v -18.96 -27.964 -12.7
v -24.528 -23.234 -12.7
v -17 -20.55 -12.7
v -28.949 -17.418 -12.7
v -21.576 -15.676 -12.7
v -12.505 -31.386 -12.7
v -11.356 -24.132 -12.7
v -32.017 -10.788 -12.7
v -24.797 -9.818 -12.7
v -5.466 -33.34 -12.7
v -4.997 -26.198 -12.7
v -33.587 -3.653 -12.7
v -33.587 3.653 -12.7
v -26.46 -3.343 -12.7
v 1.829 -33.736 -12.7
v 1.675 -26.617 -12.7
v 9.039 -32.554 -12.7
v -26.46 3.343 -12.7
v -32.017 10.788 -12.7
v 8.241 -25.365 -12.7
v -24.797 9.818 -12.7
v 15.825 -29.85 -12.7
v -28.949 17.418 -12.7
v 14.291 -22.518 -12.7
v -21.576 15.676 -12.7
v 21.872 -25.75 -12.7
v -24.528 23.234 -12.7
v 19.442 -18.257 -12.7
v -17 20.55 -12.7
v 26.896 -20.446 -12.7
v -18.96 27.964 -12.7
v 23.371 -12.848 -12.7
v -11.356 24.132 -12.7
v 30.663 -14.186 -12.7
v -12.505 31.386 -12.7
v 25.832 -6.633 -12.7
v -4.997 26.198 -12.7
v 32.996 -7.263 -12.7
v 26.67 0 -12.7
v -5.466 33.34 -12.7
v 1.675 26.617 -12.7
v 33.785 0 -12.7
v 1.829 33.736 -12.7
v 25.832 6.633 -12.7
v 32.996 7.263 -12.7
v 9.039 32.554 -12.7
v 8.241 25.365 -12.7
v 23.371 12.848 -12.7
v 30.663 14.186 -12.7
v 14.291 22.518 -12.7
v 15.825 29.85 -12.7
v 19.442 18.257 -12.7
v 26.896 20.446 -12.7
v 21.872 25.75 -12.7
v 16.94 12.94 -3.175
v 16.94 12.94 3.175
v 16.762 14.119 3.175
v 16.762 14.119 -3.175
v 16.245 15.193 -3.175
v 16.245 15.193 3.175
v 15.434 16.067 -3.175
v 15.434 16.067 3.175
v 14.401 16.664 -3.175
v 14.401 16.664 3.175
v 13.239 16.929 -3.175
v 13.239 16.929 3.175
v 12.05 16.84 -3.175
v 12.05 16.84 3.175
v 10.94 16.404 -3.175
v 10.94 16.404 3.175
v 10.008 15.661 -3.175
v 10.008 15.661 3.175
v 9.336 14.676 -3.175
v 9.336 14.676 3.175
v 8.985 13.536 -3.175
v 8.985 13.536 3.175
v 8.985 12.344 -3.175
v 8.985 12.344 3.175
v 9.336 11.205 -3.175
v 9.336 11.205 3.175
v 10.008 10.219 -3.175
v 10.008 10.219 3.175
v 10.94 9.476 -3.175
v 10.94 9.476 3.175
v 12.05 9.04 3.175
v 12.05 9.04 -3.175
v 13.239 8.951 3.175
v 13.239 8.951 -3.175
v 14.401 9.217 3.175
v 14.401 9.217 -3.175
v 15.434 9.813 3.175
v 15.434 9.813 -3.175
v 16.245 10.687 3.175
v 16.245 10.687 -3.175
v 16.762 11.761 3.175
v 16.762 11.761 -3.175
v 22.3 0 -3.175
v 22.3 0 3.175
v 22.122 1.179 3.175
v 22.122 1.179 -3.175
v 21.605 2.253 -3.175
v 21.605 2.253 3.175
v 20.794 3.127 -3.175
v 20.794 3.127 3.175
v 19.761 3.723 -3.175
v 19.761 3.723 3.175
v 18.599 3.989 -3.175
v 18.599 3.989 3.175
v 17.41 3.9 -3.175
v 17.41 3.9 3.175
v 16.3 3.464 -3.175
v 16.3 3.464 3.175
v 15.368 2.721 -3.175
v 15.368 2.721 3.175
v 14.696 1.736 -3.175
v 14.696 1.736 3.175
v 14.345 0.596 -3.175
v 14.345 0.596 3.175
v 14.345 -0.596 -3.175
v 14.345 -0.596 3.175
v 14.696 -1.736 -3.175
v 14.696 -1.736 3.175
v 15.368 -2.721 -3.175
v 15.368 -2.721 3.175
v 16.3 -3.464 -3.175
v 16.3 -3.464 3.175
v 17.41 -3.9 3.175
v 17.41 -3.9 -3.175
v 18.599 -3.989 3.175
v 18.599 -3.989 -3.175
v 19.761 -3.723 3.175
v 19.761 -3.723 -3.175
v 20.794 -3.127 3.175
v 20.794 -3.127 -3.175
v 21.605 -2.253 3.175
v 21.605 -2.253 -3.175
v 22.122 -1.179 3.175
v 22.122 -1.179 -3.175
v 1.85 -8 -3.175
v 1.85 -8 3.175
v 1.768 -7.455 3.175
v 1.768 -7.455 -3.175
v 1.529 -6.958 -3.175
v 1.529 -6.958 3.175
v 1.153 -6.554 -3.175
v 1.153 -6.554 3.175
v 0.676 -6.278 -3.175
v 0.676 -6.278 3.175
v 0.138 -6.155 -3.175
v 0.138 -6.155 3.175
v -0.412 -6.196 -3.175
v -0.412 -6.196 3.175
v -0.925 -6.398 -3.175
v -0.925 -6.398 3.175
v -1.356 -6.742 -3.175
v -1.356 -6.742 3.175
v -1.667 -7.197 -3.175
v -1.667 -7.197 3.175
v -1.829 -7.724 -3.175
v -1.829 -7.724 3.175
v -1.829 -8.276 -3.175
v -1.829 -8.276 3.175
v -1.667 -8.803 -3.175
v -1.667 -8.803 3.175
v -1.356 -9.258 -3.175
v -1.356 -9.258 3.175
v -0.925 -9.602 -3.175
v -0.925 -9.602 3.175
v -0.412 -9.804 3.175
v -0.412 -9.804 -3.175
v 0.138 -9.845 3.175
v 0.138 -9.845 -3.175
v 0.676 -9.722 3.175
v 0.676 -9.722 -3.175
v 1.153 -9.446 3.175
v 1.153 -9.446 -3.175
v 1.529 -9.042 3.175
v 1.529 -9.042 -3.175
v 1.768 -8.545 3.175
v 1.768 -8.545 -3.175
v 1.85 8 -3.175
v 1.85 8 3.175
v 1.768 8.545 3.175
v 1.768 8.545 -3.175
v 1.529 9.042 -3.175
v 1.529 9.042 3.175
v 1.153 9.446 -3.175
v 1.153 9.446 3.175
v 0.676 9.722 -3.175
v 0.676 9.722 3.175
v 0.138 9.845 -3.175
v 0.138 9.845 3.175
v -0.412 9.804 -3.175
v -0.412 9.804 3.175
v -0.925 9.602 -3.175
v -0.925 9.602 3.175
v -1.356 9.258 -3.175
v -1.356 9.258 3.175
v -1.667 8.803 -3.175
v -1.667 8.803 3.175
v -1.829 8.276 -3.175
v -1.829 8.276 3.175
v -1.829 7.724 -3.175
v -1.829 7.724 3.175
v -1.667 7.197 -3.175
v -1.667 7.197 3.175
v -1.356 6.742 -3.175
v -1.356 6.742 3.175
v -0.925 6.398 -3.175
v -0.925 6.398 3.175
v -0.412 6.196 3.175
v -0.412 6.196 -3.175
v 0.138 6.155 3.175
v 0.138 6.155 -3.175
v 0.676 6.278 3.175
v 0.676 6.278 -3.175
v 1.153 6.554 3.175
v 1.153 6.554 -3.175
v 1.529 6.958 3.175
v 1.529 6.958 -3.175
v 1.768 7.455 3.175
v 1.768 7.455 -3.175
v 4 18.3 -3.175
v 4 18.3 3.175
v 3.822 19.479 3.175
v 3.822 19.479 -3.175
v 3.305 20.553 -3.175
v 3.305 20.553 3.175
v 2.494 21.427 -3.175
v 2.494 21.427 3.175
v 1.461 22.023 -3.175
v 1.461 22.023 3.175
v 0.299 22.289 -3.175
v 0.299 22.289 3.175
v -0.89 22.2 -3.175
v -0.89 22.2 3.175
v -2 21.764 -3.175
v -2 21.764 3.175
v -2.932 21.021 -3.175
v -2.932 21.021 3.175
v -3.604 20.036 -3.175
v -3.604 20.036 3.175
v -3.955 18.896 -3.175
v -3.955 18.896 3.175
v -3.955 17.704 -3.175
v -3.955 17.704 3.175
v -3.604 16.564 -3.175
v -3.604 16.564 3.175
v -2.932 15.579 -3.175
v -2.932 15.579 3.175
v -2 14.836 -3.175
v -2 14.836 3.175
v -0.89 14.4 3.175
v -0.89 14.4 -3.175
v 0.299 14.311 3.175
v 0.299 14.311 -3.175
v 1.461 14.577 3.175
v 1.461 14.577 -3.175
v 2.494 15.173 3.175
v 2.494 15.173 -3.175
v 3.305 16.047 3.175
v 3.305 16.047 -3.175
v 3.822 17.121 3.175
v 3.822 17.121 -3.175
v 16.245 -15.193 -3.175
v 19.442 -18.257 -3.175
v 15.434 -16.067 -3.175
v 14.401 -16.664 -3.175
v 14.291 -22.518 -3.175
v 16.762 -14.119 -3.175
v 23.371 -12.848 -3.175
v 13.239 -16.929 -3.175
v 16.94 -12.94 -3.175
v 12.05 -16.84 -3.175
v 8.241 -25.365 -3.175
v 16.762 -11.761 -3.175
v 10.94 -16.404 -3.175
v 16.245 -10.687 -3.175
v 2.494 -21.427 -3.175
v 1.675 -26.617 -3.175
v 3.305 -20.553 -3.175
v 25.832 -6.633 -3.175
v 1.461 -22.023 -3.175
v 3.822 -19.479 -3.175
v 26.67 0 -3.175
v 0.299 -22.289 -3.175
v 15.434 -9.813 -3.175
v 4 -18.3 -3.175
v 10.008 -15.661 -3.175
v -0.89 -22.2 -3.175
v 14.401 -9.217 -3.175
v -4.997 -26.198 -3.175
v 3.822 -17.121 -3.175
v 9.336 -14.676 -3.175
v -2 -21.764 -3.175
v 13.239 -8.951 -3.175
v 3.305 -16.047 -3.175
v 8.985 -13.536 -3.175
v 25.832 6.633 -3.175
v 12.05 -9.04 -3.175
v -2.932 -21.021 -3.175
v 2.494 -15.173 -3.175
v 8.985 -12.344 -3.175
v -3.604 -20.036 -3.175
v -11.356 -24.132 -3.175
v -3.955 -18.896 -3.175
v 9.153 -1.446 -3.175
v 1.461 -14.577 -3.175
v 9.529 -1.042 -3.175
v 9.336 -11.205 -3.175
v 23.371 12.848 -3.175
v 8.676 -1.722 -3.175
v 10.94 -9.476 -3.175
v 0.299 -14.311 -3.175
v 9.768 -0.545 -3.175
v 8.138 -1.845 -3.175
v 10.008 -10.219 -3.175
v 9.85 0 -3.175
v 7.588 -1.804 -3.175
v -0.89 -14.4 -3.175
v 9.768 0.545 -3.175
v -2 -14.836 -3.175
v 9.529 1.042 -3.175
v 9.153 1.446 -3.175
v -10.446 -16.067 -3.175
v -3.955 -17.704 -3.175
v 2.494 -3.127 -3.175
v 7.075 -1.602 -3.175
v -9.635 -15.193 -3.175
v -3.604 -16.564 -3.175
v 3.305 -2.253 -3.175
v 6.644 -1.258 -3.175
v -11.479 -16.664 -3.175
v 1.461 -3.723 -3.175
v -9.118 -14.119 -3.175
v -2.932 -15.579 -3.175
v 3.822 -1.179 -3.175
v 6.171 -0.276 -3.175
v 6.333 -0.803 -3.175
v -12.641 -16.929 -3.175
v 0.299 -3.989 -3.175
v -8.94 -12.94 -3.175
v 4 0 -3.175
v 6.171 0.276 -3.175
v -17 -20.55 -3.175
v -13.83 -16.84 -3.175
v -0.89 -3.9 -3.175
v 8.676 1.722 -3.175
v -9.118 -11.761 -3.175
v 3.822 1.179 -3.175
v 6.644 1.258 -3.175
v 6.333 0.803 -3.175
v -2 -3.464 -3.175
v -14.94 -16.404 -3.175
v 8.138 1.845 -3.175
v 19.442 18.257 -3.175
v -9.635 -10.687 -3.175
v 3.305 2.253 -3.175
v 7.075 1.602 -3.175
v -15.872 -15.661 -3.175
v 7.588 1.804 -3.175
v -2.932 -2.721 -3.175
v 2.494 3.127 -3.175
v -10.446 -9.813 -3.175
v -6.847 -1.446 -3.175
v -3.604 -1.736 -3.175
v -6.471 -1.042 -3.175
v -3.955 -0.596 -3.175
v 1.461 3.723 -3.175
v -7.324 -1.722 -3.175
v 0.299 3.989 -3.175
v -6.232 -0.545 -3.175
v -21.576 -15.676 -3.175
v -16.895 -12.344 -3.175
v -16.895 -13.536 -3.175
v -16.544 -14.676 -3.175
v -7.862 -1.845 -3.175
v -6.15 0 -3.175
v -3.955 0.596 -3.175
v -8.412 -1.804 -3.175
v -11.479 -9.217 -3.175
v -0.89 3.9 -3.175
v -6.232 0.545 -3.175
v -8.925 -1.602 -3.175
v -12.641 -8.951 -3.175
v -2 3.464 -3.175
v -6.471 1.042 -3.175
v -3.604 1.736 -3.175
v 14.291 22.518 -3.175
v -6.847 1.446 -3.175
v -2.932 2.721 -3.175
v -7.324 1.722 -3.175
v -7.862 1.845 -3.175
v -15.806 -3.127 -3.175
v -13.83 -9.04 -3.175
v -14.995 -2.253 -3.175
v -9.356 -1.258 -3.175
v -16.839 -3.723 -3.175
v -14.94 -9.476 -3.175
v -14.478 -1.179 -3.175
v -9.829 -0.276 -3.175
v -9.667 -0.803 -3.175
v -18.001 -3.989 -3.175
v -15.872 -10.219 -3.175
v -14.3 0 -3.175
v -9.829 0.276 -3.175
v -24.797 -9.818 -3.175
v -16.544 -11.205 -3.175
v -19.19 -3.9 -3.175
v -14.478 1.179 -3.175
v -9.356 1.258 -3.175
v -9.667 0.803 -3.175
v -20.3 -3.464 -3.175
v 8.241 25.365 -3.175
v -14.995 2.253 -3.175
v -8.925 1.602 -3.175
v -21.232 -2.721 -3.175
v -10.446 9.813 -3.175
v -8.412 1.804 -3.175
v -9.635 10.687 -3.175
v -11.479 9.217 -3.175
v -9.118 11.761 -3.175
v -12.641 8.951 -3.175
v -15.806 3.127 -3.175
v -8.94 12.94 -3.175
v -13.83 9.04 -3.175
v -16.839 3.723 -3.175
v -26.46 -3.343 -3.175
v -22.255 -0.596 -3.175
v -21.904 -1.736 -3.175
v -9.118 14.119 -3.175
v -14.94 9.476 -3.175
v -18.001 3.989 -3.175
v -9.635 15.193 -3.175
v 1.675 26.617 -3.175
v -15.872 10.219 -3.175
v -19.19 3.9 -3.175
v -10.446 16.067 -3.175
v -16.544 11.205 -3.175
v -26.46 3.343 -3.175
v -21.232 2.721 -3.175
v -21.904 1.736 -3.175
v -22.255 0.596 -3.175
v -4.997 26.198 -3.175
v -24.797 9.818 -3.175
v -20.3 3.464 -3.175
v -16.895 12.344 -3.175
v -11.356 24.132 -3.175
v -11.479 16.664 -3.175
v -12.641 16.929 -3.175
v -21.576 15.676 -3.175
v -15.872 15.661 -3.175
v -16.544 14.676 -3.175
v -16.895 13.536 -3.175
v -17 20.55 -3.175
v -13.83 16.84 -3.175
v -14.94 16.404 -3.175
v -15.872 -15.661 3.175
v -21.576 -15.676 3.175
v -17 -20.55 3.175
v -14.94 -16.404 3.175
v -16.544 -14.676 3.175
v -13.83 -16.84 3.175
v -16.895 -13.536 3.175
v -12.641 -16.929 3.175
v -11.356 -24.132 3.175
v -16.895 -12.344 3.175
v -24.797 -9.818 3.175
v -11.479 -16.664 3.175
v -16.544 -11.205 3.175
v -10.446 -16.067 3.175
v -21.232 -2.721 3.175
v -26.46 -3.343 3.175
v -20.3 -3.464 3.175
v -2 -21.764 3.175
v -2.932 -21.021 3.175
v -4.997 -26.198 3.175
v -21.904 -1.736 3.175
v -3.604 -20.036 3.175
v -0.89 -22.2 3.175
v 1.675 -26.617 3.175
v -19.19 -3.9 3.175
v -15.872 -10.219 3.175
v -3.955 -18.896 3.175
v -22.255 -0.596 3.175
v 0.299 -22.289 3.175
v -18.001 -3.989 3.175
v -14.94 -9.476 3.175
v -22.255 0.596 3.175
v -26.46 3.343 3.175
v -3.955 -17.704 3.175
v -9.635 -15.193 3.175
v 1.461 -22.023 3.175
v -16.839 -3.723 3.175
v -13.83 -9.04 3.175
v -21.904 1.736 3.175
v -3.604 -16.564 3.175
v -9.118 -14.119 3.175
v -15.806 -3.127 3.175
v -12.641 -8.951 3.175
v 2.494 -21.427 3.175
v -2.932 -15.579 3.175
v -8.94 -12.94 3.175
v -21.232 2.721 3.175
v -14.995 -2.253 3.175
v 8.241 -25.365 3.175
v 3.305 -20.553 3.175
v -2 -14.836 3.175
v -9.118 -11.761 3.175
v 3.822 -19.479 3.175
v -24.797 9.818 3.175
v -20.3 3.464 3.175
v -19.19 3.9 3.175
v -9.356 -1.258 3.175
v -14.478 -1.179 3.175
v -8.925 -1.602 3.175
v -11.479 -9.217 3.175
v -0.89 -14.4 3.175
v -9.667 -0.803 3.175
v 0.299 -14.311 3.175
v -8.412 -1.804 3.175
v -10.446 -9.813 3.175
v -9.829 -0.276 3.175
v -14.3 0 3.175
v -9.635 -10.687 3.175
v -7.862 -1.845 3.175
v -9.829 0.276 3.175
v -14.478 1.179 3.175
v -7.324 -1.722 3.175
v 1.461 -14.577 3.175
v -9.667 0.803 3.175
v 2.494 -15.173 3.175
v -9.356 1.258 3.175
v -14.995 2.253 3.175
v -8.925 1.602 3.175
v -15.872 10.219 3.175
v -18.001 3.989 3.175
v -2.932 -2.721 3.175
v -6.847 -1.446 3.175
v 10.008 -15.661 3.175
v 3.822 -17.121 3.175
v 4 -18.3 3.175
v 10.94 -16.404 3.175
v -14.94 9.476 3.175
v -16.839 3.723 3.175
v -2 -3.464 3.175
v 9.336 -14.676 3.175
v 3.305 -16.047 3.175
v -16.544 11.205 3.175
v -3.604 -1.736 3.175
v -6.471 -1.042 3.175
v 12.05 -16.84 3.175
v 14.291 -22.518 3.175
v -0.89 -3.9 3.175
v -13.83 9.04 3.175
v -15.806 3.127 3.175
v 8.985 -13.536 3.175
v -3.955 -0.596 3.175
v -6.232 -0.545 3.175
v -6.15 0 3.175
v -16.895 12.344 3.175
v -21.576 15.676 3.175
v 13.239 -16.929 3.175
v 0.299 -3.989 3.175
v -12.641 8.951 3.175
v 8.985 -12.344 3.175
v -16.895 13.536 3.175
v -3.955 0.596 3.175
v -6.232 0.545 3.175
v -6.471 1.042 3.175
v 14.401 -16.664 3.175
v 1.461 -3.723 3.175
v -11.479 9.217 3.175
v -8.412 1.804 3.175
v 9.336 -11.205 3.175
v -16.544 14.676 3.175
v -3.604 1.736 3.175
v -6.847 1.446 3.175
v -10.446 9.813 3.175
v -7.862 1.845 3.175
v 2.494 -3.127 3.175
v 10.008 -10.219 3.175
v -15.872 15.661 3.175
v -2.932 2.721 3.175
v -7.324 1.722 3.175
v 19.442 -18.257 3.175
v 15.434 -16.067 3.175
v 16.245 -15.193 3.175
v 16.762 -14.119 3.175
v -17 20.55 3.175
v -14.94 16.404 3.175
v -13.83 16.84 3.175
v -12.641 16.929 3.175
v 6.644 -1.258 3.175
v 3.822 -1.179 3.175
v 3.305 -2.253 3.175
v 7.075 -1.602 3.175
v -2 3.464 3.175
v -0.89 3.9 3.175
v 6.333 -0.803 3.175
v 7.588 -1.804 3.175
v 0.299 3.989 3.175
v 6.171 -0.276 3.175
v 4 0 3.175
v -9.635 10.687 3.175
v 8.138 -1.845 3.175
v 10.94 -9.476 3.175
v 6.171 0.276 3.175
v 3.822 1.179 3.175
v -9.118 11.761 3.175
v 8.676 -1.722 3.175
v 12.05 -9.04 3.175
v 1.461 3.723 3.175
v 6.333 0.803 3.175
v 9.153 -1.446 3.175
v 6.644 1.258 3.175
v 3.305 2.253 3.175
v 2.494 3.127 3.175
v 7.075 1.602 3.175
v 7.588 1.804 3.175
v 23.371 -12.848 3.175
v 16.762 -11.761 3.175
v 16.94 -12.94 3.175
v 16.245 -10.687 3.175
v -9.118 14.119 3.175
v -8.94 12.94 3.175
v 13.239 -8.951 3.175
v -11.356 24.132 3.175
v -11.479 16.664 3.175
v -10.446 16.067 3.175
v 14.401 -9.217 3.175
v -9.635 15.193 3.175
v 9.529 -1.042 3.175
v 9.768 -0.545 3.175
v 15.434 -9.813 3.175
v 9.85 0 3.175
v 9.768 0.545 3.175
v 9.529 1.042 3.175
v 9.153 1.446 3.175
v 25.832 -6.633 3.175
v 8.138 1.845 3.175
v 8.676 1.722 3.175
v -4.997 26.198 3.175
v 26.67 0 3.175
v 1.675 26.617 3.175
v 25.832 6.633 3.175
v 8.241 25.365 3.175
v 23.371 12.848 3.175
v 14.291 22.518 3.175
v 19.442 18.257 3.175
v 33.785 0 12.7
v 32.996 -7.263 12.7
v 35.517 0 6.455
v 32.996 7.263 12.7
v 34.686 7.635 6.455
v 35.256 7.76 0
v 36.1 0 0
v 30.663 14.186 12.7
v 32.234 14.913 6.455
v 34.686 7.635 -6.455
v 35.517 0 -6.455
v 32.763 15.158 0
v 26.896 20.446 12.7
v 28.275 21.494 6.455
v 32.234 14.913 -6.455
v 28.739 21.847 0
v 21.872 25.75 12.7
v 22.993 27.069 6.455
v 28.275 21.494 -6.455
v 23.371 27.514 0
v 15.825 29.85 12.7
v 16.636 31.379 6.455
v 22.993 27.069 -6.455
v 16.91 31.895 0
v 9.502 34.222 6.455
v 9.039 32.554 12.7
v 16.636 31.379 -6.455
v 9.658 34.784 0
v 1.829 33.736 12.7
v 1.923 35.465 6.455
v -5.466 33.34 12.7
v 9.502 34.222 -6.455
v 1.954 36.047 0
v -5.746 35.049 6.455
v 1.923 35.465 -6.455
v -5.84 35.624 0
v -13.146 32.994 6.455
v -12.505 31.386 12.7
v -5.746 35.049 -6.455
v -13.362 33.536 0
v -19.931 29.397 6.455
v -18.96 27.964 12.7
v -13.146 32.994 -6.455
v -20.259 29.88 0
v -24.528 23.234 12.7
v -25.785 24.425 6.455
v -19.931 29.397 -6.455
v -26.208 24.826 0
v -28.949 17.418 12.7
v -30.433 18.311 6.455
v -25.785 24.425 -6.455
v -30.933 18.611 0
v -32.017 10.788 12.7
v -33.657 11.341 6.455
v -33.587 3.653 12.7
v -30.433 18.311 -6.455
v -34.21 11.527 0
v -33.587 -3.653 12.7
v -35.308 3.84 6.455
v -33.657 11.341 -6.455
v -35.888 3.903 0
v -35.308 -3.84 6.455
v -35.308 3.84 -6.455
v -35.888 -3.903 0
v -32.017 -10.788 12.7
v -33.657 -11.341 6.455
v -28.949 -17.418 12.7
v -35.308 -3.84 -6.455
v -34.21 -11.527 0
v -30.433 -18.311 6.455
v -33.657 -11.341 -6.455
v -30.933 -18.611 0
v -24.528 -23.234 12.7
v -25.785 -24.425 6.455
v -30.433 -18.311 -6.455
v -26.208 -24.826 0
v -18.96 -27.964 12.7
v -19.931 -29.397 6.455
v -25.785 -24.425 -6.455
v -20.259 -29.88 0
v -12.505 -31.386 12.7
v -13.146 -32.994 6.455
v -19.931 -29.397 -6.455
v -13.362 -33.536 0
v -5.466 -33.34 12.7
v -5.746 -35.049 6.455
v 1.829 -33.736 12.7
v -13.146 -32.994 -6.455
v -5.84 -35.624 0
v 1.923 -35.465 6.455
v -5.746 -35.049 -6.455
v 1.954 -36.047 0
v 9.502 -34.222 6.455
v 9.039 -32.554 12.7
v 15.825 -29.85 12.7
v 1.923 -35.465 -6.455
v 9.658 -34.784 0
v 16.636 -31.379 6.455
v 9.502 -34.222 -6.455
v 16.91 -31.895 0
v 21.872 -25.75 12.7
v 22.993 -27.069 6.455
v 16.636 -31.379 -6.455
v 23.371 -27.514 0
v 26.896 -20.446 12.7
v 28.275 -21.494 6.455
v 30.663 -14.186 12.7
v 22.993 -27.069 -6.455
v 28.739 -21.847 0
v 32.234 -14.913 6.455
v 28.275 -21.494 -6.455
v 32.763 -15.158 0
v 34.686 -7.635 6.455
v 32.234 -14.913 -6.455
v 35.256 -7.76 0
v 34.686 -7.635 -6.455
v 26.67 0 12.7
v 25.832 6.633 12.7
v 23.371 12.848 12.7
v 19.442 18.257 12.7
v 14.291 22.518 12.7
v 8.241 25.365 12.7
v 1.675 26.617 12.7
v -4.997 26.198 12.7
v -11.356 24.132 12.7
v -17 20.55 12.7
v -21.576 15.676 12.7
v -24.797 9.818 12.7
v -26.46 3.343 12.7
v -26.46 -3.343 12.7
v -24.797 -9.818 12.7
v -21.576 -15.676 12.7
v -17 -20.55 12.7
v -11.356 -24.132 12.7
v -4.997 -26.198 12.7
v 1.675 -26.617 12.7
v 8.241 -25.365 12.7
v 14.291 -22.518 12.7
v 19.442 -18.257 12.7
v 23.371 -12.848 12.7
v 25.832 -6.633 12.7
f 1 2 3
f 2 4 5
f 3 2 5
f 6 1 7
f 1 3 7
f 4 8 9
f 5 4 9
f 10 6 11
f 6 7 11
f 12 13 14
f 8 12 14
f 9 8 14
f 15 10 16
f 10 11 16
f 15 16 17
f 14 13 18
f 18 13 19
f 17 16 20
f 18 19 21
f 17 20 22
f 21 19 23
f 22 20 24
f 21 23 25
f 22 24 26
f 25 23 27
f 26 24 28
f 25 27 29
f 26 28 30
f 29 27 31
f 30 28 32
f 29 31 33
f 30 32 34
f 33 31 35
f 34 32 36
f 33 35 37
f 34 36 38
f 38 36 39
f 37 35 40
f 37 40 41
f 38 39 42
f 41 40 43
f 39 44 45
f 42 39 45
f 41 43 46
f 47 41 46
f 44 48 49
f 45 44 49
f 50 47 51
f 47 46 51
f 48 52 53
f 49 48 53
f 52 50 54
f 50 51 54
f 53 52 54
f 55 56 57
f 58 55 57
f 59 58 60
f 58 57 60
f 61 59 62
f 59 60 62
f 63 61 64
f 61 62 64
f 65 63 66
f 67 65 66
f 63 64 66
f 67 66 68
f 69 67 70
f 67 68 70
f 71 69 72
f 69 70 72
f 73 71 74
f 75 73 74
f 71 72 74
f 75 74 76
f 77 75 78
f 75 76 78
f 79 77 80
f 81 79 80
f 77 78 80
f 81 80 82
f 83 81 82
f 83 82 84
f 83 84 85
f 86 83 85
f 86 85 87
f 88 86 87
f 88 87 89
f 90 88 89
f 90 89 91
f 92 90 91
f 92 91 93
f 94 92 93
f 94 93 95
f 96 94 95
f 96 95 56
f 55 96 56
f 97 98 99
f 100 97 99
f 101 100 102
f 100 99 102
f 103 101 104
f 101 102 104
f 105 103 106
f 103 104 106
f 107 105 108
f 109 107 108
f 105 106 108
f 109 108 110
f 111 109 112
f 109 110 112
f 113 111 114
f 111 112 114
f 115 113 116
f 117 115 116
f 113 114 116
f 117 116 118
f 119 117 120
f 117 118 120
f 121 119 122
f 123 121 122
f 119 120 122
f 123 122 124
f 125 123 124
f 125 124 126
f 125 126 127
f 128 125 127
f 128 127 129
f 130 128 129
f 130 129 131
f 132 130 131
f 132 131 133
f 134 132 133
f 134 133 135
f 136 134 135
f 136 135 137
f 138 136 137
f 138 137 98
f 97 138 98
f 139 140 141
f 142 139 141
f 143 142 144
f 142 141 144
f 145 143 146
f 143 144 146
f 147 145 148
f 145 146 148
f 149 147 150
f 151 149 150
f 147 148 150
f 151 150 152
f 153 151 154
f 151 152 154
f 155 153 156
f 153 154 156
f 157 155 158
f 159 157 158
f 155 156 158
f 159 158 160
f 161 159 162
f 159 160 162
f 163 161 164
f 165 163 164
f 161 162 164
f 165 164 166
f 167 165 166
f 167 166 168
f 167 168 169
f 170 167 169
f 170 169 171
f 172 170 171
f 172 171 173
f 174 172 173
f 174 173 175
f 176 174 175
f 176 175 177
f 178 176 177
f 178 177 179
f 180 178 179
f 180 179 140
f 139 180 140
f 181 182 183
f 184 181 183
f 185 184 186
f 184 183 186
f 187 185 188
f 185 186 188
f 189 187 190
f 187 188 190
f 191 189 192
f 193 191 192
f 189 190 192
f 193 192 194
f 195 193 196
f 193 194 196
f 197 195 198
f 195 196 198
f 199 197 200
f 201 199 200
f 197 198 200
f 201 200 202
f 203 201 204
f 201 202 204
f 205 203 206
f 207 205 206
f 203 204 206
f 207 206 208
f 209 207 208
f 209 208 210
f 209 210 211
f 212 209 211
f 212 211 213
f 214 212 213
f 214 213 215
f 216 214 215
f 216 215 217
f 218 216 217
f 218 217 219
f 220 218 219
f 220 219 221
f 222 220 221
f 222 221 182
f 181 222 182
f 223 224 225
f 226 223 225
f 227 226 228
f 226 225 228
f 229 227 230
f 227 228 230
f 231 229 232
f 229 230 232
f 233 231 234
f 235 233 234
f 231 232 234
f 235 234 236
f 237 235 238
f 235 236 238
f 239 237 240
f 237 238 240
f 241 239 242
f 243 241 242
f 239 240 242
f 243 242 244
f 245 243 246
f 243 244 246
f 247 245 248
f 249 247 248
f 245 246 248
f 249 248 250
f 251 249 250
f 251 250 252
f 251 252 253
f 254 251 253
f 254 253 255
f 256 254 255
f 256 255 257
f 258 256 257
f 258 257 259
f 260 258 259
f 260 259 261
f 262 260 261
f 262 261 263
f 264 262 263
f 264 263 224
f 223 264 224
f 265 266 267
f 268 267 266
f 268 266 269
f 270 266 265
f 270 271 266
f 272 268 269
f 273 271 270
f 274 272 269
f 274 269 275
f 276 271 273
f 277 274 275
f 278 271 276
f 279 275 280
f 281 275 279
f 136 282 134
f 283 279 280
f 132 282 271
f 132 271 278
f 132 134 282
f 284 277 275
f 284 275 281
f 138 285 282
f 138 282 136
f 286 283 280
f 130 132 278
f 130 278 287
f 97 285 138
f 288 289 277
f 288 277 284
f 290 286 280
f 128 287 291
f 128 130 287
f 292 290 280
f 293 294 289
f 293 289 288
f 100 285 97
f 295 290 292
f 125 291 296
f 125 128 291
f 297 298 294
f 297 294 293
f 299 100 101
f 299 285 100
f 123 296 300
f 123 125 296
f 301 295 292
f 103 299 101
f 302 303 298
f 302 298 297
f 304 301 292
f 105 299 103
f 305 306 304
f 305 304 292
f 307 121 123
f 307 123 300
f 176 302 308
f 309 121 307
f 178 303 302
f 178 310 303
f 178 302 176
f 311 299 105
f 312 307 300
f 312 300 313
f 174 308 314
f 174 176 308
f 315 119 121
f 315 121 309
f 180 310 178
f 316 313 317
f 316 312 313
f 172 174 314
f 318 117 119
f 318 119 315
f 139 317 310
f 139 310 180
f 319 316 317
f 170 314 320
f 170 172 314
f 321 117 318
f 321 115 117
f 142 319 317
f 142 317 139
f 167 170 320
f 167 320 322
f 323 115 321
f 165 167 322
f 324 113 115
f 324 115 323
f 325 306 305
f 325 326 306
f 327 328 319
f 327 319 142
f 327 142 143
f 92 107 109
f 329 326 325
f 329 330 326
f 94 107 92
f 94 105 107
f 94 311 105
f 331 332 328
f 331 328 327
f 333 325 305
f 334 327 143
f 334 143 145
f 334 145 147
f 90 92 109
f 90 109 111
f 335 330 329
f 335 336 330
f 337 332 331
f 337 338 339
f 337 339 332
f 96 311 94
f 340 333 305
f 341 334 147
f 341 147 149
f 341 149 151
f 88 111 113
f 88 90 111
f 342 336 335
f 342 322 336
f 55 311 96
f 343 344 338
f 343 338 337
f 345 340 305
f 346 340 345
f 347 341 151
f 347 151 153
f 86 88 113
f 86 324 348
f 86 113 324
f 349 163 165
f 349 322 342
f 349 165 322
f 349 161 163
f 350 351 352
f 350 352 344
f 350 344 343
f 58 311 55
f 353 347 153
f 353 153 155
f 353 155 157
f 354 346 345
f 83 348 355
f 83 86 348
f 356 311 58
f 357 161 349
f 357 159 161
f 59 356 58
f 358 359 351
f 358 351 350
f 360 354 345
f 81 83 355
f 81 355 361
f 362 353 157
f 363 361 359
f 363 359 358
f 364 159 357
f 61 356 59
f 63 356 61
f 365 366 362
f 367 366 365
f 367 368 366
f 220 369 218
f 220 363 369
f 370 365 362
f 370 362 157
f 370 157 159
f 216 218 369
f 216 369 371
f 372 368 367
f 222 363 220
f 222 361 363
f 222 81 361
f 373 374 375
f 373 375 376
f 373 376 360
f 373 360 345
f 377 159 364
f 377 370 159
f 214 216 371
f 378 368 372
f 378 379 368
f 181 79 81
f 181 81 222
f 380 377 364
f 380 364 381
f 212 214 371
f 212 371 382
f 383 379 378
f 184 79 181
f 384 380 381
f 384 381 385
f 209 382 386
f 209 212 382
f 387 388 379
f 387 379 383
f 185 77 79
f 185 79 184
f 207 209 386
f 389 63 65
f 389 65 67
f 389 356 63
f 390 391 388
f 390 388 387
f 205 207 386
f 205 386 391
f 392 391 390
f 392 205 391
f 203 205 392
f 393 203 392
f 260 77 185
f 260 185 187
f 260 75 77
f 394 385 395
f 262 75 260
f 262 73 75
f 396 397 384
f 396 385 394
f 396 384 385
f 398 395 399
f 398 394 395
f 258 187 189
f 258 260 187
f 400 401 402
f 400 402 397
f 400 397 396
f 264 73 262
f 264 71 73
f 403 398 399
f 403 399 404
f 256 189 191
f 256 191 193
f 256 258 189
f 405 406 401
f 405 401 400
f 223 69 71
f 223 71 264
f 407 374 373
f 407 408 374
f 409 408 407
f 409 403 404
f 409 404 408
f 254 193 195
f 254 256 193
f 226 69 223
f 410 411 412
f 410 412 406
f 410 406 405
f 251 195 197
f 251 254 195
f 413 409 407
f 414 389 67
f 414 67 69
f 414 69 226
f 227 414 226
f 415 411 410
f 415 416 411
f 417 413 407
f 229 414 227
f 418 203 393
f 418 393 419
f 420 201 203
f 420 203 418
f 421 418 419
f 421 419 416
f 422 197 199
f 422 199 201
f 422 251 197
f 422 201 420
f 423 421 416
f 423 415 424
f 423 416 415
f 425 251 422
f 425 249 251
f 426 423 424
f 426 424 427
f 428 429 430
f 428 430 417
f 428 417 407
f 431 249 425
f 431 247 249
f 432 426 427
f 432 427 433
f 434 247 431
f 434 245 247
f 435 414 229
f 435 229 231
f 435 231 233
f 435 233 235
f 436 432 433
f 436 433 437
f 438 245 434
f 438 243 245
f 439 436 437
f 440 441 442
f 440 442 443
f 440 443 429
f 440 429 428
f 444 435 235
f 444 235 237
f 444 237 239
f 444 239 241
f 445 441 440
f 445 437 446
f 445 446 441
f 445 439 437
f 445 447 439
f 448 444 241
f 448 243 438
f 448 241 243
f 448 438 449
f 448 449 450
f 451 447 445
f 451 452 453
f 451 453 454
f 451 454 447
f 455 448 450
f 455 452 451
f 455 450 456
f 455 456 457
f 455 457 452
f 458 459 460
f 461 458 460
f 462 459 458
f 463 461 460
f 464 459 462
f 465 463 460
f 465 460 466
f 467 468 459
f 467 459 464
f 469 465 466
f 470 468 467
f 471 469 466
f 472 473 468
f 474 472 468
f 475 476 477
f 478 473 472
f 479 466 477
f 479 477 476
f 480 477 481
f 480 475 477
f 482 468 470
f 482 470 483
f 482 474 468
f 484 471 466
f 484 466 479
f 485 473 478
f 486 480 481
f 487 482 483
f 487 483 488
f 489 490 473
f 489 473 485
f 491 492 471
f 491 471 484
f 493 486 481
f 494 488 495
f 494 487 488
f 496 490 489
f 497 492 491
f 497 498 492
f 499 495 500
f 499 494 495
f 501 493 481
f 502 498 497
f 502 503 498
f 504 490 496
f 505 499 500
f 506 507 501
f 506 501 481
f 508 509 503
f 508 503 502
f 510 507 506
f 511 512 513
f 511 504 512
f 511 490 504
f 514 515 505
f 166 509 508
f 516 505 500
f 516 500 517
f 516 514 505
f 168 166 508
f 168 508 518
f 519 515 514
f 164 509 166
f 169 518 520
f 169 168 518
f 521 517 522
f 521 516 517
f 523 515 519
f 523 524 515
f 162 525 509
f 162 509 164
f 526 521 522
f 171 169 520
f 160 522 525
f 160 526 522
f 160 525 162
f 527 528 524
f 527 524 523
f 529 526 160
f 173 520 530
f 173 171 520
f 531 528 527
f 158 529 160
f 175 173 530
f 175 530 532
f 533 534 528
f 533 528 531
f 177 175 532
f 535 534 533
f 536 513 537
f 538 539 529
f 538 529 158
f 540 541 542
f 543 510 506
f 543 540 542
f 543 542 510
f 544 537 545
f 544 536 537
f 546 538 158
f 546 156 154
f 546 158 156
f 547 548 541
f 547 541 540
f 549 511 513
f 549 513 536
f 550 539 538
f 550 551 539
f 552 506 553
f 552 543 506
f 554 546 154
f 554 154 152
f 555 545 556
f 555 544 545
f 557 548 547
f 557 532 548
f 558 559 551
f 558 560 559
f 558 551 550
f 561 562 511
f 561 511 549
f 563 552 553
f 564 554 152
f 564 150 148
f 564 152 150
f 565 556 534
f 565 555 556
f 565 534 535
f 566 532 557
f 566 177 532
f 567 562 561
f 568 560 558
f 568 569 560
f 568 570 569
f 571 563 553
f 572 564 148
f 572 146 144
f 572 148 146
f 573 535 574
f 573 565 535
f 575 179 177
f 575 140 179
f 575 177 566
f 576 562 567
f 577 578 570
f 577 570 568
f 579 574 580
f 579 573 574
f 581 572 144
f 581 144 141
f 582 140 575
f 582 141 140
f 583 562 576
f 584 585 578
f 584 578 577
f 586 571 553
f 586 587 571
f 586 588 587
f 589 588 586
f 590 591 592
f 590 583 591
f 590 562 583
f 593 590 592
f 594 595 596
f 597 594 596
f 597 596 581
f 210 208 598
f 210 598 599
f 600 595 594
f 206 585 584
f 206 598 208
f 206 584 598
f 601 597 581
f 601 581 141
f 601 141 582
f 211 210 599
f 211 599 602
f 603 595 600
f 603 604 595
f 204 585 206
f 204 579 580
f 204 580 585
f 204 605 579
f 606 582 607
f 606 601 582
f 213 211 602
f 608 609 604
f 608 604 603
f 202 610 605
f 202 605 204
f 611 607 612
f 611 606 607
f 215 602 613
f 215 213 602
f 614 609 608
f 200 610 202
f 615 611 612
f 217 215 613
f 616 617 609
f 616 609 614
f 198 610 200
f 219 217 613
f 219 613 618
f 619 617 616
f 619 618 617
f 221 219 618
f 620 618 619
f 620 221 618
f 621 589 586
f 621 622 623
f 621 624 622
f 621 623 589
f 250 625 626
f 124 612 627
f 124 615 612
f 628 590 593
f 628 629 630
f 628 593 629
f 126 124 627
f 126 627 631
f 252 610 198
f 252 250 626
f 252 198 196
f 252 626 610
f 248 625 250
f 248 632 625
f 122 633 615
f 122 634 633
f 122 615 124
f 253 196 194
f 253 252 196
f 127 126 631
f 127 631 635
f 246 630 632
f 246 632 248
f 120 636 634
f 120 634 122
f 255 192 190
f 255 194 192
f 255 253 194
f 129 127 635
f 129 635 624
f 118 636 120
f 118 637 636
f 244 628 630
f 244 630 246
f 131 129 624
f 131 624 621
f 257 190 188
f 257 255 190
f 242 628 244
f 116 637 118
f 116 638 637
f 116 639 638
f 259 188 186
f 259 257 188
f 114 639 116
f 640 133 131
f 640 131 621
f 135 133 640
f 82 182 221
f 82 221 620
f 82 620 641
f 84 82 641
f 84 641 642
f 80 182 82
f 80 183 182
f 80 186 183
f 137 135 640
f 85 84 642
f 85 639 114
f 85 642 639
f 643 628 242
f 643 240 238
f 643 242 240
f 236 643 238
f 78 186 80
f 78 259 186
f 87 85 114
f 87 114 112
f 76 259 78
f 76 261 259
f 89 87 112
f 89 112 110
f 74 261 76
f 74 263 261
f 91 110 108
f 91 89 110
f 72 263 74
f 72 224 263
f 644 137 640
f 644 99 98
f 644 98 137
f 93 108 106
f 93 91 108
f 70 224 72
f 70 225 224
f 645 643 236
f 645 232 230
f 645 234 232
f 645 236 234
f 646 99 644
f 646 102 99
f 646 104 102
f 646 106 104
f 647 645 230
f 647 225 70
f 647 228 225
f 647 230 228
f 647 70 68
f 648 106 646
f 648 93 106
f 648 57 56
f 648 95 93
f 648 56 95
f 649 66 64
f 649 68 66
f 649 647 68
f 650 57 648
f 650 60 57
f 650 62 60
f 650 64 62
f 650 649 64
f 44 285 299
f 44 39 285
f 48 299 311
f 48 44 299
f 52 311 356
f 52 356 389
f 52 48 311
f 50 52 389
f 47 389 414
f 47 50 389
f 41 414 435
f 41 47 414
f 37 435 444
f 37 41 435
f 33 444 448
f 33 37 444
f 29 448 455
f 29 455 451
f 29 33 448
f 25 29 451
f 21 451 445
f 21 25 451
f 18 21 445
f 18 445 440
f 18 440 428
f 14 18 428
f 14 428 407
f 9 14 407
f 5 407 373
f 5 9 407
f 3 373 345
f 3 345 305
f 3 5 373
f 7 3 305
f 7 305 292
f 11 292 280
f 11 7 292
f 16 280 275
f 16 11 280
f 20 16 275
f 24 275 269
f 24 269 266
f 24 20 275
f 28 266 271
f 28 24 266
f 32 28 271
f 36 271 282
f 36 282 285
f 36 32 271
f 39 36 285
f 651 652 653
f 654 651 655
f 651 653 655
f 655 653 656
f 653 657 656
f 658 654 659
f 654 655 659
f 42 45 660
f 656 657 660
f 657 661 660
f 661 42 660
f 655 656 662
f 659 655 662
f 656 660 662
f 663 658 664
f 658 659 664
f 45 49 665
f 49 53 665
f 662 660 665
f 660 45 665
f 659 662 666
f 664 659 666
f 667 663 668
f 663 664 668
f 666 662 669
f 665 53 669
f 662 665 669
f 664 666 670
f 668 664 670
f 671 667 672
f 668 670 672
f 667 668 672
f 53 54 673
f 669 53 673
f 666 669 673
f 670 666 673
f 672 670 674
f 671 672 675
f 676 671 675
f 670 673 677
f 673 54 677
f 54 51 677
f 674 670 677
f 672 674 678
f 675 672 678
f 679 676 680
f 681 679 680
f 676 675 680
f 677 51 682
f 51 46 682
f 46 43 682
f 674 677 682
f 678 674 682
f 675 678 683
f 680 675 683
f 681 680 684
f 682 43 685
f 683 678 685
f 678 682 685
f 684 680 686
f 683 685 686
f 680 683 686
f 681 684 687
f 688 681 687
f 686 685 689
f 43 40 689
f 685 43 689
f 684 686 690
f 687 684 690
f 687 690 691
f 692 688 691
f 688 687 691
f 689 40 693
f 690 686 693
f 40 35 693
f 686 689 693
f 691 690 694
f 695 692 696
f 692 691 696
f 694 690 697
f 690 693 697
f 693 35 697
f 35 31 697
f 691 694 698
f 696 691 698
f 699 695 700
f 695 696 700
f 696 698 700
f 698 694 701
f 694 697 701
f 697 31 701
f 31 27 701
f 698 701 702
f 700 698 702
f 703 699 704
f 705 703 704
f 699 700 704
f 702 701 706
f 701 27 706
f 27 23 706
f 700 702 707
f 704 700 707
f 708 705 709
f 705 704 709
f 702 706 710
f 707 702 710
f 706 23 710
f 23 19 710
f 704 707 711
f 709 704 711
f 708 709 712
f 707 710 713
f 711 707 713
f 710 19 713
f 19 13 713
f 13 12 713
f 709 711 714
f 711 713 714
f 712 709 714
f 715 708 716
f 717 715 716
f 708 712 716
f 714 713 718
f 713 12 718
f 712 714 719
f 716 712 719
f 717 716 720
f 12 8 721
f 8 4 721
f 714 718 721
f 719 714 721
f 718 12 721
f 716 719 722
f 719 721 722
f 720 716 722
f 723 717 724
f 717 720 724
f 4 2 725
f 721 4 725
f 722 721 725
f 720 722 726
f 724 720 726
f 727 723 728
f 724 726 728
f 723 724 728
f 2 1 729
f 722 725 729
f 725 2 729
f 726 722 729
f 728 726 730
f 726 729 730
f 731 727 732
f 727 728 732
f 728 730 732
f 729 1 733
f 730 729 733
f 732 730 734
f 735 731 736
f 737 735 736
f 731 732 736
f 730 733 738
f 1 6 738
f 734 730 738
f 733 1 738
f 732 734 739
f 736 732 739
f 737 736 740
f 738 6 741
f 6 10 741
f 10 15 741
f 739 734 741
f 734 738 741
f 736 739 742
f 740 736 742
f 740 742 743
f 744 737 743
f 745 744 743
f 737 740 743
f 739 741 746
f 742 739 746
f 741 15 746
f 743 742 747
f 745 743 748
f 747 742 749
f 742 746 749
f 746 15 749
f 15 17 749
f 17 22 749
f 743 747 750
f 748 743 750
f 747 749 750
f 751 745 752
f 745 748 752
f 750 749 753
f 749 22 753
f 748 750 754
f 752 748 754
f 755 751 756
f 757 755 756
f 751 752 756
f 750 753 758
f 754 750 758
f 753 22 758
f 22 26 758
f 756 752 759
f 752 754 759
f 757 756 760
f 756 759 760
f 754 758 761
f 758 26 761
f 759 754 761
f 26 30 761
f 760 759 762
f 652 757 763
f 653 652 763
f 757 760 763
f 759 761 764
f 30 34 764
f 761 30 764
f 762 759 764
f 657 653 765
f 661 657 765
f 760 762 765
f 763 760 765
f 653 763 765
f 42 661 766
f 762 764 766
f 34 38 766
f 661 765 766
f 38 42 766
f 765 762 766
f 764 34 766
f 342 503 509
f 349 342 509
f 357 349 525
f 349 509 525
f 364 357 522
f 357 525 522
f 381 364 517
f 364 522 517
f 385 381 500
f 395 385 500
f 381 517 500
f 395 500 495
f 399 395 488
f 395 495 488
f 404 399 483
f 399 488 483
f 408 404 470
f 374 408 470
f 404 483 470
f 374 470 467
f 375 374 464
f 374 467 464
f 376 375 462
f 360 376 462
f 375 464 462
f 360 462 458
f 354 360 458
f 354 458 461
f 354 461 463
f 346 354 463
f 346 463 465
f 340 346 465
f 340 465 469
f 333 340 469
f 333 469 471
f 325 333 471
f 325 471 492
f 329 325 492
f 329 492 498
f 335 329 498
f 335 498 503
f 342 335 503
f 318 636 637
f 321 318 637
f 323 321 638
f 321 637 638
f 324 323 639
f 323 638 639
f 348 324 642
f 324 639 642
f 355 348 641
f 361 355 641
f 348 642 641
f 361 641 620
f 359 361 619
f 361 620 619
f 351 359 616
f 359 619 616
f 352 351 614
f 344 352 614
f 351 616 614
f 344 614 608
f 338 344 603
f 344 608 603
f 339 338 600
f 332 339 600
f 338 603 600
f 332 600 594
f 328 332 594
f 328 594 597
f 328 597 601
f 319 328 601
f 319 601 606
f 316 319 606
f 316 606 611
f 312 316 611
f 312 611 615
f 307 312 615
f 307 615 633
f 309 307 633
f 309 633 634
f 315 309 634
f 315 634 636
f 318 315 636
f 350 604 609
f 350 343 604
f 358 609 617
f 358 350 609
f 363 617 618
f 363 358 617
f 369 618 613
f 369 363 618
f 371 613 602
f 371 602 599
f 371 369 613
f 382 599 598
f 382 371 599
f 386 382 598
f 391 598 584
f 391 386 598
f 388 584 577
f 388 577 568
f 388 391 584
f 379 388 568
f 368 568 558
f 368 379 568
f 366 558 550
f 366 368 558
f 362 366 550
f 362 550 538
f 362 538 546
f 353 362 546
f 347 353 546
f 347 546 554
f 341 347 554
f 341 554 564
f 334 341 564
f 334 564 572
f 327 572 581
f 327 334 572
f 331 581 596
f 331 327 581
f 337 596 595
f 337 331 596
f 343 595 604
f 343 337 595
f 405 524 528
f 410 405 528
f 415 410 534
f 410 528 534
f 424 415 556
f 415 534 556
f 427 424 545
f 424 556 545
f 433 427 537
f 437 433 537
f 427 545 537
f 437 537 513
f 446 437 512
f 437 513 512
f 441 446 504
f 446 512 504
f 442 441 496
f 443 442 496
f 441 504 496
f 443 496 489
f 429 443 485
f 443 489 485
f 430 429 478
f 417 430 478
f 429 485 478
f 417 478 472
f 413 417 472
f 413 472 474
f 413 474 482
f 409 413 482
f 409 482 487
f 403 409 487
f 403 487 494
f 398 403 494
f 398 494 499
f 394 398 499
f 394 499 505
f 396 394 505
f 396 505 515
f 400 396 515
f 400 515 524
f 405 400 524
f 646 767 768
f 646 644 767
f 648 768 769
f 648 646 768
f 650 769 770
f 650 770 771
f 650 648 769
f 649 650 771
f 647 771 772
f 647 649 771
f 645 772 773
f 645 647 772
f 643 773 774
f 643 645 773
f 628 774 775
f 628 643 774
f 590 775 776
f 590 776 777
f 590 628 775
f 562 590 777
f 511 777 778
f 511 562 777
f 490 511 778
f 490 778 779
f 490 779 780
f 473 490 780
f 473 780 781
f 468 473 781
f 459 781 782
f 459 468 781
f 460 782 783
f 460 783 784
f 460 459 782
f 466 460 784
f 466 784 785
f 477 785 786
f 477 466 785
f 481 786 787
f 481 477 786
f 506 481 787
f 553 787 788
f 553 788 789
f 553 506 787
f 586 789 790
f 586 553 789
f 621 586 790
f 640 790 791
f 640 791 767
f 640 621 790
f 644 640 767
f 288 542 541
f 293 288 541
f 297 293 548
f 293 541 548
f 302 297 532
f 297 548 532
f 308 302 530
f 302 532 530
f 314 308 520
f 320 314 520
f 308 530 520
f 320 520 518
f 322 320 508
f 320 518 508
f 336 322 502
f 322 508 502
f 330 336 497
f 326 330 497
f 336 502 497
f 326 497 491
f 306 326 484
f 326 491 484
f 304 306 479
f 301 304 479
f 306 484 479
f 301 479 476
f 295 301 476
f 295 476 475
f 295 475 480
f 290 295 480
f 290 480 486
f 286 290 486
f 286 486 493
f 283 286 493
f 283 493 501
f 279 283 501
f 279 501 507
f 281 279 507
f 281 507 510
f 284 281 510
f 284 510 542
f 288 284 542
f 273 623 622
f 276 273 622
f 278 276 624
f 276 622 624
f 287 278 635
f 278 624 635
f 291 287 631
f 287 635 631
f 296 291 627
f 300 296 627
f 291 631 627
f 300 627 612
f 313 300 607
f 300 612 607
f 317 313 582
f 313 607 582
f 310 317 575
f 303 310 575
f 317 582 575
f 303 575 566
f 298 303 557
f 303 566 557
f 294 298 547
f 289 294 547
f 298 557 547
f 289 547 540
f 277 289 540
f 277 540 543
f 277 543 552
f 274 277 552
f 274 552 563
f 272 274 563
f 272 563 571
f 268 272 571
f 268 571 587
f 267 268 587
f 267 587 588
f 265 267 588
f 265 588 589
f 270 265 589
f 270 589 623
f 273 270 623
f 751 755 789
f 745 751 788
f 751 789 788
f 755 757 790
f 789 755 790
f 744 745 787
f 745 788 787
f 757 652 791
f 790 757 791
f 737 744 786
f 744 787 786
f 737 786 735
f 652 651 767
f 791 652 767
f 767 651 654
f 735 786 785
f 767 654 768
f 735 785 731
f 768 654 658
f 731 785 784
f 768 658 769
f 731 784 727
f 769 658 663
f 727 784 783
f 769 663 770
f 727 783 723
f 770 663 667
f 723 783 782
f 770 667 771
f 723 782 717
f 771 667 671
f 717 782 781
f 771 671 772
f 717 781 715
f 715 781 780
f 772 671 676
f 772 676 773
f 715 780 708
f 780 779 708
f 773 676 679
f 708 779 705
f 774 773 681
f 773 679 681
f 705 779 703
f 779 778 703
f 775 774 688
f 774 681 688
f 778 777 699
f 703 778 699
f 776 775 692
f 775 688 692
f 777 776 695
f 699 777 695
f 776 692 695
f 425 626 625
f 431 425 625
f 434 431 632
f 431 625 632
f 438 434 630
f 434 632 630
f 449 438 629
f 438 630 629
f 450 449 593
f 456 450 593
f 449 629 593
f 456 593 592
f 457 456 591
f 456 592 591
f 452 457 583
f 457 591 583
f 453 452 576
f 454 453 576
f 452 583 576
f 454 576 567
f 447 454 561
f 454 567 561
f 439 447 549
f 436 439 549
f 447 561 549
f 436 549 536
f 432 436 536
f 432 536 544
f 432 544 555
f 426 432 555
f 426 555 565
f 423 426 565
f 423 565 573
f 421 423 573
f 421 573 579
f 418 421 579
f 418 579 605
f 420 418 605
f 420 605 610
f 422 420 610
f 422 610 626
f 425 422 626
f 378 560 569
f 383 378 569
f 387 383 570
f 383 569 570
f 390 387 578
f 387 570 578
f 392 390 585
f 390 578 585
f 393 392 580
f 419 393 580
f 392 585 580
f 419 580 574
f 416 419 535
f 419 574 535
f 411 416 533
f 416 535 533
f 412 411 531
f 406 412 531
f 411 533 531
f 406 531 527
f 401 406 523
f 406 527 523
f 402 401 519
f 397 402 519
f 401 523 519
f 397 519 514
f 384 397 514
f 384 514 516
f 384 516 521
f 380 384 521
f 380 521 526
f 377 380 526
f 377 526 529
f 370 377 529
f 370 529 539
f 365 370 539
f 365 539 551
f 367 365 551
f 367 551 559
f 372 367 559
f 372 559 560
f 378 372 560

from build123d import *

# Parameters (mm, degrees)
F_8_0_8_DIAMETER_HOLE1_D       = 8
F_8_0_8_DIAMETER_HOLE1_DEPTH   = 15.875
F_3_7_3_7_DIAMETER_HOLE1_D     = 3.7
F_3_7_3_7_DIAMETER_HOLE1_DEPTH = 15.875


with BuildPart() as part:
    # Sketch1 → Revolve1 (revolve)
    with BuildSketch(Plane(origin=(0, 0, 0), x_dir=(1, 0, 0), z_dir=(0, 1, 0))):
        with BuildLine():
            Line((33.785456803, 12.7), (0, 12.7))
            Line((0, 12.7), (0, -12.7))
            Line((0, -12.7), (33.785456803, -12.7))
            ThreePointArc((33.785456803, -12.7), (36.1, 0), (33.785456803, 12.7))
        make_face()
    revolve(axis=Axis((0, 0, -12.7), (0, 0, 1)))

    # Sketch2 → Cut-Revolve1 (revolve, cut)
    with BuildSketch(Plane(origin=(0, 0, 0), x_dir=(1, 0, 0), z_dir=(0, 1, 0))):
        Polygon((26.67, 12.7), (0, 12.7), (0, -12.7), (26.67, -12.7), (26.67, -3.175), (4, -3.175), (4, 3.175), (26.67, 3.175), align=None)
    revolve(axis=Axis((0, 0, -12.7), (0, 0, 1)), mode=Mode.SUBTRACT)

    # Ø8.0 (8) Diameter Hole1
    with Locations(Plane(origin=(0, 0, -3.175), x_dir=(-1, 0, 0), z_dir=(0, 0, -1))):
        with Locations((0, -18.3), (-12.940054096, -12.940054096), (-18.3, 0), (-12.940054096, 12.940054096), (0, 18.3), (12.940054096, 12.940054096), (18.3, 0), (12.940054096, -12.940054096)):
            Hole(F_8_0_8_DIAMETER_HOLE1_D / 2, depth=F_8_0_8_DIAMETER_HOLE1_DEPTH)

    # Ø3.7 (3.7) Diameter Hole1
    with Locations(Plane(origin=(0, 0, -3.175), x_dir=(-1, 0, 0), z_dir=(0, 0, -1))):
        with Locations((-8, 0), (0, -8), (8, 0), (0, 8)):
            Hole(F_3_7_3_7_DIAMETER_HOLE1_D / 2, depth=F_3_7_3_7_DIAMETER_HOLE1_DEPTH)


solid = part.part
